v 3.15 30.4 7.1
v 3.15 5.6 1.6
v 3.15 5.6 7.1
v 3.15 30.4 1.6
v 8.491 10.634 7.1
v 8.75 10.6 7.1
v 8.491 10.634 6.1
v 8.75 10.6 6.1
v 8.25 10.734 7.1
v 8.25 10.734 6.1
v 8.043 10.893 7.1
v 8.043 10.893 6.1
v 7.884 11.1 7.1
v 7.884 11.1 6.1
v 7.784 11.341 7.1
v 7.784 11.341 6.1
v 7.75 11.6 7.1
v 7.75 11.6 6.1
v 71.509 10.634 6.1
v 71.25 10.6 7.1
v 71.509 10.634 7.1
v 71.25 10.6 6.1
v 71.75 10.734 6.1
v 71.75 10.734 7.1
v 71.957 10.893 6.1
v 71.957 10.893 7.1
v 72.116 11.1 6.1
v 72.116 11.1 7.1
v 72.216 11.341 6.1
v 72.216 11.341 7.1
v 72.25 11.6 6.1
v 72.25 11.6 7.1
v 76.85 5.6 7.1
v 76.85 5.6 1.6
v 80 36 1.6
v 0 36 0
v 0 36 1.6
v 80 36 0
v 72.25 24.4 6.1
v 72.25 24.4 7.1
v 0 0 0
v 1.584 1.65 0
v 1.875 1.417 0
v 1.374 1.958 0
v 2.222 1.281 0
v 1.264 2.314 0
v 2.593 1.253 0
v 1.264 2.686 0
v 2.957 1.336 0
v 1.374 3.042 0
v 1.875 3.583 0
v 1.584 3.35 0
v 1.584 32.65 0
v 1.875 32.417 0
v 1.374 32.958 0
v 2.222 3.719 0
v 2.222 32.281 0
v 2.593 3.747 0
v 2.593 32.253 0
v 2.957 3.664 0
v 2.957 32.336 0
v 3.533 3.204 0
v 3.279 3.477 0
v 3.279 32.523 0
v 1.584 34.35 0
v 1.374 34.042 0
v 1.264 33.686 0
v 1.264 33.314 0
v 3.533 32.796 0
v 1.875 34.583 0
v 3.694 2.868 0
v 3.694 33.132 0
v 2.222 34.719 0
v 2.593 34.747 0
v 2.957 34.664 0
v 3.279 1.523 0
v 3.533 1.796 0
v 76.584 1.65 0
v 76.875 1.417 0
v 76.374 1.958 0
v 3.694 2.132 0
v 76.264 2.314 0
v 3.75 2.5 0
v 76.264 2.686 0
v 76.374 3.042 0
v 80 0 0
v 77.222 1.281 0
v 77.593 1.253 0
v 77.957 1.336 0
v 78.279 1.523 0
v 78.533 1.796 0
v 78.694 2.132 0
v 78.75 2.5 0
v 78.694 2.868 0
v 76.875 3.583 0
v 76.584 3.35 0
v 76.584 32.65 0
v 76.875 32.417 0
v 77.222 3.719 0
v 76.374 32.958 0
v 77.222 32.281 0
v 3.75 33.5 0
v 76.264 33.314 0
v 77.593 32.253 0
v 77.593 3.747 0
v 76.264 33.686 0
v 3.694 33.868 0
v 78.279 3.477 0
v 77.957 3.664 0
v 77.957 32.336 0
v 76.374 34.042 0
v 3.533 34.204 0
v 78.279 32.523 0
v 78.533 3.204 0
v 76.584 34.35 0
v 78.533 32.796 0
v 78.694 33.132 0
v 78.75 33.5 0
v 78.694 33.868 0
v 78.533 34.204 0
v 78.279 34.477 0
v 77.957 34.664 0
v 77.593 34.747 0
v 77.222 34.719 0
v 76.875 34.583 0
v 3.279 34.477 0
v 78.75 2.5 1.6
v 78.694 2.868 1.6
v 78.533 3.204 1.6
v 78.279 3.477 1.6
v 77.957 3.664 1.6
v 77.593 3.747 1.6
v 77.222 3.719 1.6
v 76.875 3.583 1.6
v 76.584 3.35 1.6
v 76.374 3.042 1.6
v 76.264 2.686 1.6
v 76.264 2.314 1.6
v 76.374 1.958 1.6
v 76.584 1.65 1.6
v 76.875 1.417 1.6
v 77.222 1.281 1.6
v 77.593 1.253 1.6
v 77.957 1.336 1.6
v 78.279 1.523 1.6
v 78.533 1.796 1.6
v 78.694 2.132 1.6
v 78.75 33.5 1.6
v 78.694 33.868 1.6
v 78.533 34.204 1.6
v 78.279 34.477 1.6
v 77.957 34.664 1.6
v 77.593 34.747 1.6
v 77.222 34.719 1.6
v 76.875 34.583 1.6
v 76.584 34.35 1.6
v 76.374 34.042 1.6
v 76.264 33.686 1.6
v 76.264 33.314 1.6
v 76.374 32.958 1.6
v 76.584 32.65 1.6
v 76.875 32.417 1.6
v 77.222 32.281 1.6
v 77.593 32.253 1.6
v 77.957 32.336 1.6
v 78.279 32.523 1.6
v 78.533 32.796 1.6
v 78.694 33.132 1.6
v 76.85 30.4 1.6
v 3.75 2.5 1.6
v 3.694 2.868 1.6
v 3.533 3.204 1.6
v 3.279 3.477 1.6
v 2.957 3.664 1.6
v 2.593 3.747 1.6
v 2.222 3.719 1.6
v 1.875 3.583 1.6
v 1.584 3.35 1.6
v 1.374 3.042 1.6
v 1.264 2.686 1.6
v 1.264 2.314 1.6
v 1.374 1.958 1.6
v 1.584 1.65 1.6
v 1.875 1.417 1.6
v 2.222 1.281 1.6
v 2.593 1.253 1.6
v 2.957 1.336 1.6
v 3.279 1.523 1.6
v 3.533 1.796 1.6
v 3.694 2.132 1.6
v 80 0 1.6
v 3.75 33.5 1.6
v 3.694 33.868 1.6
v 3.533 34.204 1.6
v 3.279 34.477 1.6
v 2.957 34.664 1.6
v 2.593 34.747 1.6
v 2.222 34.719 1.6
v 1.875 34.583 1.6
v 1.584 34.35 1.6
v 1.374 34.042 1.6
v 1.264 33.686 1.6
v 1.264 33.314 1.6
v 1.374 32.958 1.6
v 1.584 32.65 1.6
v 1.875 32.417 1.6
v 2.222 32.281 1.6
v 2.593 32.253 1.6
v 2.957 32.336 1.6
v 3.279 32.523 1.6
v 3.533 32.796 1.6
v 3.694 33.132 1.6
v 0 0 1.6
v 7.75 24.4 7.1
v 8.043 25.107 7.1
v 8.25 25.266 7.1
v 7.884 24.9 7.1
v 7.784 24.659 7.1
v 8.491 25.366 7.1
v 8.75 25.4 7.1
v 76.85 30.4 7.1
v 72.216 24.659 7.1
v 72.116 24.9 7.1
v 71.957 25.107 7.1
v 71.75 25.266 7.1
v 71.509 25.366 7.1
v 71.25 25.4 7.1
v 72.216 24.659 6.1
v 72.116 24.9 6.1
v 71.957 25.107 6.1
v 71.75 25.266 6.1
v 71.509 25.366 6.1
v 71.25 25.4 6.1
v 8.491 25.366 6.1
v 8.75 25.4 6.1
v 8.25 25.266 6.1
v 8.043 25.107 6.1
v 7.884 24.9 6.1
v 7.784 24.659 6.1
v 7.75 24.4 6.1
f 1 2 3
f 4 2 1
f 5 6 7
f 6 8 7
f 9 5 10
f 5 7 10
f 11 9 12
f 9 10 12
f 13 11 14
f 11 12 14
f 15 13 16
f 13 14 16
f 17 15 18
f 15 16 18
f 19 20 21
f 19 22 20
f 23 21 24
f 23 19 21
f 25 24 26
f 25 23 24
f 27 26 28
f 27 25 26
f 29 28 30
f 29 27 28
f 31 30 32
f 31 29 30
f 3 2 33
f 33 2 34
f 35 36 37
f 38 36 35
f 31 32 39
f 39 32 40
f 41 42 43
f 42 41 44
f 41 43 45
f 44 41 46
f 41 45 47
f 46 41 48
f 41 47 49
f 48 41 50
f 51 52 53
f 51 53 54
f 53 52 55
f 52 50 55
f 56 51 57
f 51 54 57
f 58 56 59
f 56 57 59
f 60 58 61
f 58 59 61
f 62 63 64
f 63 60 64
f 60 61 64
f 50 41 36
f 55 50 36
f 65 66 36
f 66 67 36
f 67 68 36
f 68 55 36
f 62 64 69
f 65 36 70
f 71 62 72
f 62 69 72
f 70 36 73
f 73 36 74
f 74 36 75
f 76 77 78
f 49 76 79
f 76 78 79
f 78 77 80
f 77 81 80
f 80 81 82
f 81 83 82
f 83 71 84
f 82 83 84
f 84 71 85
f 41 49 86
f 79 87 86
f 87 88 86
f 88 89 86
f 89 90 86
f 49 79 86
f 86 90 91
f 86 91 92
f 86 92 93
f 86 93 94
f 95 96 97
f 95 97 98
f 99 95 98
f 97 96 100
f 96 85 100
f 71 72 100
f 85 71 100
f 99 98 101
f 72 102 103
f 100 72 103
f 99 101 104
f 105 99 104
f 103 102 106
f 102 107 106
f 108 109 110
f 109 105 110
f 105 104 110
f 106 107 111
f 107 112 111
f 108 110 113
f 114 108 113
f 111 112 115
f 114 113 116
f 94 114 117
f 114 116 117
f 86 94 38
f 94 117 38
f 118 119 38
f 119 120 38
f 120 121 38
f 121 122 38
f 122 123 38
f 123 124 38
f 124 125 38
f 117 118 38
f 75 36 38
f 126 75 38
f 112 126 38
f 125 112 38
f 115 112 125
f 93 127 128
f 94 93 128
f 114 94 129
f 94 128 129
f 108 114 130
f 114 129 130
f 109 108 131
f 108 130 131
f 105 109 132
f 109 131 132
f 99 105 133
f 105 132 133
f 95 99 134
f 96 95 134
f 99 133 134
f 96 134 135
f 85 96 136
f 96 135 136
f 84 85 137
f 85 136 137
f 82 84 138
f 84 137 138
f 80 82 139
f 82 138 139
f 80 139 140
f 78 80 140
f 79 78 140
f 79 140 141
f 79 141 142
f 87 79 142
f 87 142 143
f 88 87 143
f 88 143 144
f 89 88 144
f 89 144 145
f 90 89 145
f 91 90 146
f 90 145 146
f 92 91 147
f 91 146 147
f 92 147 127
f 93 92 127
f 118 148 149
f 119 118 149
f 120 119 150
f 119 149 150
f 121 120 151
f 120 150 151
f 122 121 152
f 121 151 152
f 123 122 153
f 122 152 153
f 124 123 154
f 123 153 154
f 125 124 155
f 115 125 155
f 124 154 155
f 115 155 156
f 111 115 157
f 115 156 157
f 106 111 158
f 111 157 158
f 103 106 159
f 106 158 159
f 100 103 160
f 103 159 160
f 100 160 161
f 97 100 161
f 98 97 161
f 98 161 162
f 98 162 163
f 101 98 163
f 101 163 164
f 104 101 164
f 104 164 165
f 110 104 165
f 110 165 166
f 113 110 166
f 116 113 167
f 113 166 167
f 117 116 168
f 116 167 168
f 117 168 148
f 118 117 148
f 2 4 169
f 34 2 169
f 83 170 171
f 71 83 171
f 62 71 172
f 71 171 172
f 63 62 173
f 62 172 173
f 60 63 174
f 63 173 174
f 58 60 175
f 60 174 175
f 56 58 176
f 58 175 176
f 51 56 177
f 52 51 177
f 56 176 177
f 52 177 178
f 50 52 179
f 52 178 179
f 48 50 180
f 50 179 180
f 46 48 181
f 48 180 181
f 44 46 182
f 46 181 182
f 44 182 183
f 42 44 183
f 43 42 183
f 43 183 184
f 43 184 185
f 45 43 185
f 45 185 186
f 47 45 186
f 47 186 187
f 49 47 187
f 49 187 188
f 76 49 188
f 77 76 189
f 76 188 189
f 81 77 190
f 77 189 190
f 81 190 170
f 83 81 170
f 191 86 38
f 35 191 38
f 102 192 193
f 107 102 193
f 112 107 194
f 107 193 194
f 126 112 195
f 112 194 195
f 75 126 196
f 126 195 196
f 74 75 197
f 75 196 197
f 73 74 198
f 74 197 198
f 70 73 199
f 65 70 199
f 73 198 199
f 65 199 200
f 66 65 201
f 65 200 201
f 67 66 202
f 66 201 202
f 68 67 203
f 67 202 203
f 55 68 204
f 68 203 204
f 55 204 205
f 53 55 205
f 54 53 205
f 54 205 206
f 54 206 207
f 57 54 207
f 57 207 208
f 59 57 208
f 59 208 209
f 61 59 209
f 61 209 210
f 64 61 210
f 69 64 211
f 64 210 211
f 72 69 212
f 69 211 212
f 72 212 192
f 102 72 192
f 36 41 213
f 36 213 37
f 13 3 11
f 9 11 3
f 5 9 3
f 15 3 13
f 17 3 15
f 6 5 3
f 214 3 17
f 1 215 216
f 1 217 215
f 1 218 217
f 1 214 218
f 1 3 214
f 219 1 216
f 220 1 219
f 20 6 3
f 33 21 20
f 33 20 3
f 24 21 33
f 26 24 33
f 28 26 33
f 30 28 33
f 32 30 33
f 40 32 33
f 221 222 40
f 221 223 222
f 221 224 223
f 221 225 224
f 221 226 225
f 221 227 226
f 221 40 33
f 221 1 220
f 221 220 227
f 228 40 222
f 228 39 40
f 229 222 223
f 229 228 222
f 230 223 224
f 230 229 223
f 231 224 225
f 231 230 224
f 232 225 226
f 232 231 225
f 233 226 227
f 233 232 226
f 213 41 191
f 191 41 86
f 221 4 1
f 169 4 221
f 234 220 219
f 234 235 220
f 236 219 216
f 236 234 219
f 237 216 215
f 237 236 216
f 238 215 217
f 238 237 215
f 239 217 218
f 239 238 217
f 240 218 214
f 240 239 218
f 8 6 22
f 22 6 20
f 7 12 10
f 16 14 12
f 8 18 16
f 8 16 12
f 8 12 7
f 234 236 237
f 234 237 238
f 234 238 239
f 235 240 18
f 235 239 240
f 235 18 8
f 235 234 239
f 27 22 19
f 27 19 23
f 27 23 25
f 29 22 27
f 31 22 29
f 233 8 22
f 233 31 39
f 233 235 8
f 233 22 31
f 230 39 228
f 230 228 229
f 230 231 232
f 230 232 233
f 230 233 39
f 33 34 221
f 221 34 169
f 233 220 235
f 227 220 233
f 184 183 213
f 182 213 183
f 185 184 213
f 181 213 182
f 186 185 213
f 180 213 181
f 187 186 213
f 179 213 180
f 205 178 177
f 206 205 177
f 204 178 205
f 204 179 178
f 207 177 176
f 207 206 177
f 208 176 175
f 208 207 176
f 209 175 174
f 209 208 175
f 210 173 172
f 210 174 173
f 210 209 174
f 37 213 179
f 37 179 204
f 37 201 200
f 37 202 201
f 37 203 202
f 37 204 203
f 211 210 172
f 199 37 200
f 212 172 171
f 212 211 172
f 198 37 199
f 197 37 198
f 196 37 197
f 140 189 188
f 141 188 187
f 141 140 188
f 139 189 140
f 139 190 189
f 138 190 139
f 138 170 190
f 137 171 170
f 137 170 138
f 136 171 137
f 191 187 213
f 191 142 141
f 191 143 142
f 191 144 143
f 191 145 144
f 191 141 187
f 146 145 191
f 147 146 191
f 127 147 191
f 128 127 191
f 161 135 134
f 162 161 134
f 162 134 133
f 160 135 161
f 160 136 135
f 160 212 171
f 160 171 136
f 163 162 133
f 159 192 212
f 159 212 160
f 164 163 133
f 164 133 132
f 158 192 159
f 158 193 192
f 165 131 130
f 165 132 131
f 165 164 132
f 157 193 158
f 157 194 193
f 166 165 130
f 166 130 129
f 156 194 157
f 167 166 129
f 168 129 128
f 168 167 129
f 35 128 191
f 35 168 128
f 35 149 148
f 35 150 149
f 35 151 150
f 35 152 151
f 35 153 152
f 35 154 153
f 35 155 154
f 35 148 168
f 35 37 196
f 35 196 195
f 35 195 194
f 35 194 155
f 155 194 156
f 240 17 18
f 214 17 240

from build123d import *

# Parameters (mm, degrees)
F0_W     = 80
F0_H     = 36
F1_DEPTH = 1.6
F2_R     = 1.25
F3_DEPTH = 1.6
F4_W     = 73.7
F4_H     = 24.8
F5_DEPTH = 5.5
F6_W     = 64.5
F6_H     = 14.8
F7_DEPTH = 1
F8_R     = 1


with BuildPart() as f1:
    # F0 (on Top) → F1 (new body)
    with BuildSketch(Plane.XY):
        with Locations((40, 18)):
            Rectangle(F0_W, F0_H)
    extrude(amount=F1_DEPTH)

    # F2 (on face) → F3 (cut, through all)
    with BuildSketch(Plane.XY.offset(1.6)):
        with Locations((2.5, 2.5)):
            Circle(F2_R)
        with Locations((2.5, 33.5)):
            Circle(F2_R)
        with Locations((77.5, 2.5)):
            Circle(F2_R)
        with Locations((77.5, 33.5)):
            Circle(F2_R)
    extrude(amount=-F3_DEPTH, mode=Mode.SUBTRACT)


with BuildPart() as f5:
    # F4 (on face) → F5 (new body)
    with BuildSketch(Plane.XY.offset(1.6)):
        with Locations((40, 18)):
            Rectangle(F4_W, F4_H)
    extrude(amount=F5_DEPTH)

    # F6 (on face) → F7 (cut)
    with BuildSketch(Plane.XY.offset(7.1)):
        with Locations((40, 18)):
            Rectangle(F6_W, F6_H)
    extrude(amount=-F7_DEPTH, mode=Mode.SUBTRACT)

    # F8
    f8_edges = [f5.edges().sort_by_distance(p)[0] for p in [
        (7.75, 25.4, 6.6),
        (7.75, 10.6, 6.6),
        (72.25, 25.4, 6.6),
        (72.25, 10.6, 6.6),
    ]]
    fillet(f8_edges, radius=F8_R)


solid = Compound([f1.part, f5.part])
